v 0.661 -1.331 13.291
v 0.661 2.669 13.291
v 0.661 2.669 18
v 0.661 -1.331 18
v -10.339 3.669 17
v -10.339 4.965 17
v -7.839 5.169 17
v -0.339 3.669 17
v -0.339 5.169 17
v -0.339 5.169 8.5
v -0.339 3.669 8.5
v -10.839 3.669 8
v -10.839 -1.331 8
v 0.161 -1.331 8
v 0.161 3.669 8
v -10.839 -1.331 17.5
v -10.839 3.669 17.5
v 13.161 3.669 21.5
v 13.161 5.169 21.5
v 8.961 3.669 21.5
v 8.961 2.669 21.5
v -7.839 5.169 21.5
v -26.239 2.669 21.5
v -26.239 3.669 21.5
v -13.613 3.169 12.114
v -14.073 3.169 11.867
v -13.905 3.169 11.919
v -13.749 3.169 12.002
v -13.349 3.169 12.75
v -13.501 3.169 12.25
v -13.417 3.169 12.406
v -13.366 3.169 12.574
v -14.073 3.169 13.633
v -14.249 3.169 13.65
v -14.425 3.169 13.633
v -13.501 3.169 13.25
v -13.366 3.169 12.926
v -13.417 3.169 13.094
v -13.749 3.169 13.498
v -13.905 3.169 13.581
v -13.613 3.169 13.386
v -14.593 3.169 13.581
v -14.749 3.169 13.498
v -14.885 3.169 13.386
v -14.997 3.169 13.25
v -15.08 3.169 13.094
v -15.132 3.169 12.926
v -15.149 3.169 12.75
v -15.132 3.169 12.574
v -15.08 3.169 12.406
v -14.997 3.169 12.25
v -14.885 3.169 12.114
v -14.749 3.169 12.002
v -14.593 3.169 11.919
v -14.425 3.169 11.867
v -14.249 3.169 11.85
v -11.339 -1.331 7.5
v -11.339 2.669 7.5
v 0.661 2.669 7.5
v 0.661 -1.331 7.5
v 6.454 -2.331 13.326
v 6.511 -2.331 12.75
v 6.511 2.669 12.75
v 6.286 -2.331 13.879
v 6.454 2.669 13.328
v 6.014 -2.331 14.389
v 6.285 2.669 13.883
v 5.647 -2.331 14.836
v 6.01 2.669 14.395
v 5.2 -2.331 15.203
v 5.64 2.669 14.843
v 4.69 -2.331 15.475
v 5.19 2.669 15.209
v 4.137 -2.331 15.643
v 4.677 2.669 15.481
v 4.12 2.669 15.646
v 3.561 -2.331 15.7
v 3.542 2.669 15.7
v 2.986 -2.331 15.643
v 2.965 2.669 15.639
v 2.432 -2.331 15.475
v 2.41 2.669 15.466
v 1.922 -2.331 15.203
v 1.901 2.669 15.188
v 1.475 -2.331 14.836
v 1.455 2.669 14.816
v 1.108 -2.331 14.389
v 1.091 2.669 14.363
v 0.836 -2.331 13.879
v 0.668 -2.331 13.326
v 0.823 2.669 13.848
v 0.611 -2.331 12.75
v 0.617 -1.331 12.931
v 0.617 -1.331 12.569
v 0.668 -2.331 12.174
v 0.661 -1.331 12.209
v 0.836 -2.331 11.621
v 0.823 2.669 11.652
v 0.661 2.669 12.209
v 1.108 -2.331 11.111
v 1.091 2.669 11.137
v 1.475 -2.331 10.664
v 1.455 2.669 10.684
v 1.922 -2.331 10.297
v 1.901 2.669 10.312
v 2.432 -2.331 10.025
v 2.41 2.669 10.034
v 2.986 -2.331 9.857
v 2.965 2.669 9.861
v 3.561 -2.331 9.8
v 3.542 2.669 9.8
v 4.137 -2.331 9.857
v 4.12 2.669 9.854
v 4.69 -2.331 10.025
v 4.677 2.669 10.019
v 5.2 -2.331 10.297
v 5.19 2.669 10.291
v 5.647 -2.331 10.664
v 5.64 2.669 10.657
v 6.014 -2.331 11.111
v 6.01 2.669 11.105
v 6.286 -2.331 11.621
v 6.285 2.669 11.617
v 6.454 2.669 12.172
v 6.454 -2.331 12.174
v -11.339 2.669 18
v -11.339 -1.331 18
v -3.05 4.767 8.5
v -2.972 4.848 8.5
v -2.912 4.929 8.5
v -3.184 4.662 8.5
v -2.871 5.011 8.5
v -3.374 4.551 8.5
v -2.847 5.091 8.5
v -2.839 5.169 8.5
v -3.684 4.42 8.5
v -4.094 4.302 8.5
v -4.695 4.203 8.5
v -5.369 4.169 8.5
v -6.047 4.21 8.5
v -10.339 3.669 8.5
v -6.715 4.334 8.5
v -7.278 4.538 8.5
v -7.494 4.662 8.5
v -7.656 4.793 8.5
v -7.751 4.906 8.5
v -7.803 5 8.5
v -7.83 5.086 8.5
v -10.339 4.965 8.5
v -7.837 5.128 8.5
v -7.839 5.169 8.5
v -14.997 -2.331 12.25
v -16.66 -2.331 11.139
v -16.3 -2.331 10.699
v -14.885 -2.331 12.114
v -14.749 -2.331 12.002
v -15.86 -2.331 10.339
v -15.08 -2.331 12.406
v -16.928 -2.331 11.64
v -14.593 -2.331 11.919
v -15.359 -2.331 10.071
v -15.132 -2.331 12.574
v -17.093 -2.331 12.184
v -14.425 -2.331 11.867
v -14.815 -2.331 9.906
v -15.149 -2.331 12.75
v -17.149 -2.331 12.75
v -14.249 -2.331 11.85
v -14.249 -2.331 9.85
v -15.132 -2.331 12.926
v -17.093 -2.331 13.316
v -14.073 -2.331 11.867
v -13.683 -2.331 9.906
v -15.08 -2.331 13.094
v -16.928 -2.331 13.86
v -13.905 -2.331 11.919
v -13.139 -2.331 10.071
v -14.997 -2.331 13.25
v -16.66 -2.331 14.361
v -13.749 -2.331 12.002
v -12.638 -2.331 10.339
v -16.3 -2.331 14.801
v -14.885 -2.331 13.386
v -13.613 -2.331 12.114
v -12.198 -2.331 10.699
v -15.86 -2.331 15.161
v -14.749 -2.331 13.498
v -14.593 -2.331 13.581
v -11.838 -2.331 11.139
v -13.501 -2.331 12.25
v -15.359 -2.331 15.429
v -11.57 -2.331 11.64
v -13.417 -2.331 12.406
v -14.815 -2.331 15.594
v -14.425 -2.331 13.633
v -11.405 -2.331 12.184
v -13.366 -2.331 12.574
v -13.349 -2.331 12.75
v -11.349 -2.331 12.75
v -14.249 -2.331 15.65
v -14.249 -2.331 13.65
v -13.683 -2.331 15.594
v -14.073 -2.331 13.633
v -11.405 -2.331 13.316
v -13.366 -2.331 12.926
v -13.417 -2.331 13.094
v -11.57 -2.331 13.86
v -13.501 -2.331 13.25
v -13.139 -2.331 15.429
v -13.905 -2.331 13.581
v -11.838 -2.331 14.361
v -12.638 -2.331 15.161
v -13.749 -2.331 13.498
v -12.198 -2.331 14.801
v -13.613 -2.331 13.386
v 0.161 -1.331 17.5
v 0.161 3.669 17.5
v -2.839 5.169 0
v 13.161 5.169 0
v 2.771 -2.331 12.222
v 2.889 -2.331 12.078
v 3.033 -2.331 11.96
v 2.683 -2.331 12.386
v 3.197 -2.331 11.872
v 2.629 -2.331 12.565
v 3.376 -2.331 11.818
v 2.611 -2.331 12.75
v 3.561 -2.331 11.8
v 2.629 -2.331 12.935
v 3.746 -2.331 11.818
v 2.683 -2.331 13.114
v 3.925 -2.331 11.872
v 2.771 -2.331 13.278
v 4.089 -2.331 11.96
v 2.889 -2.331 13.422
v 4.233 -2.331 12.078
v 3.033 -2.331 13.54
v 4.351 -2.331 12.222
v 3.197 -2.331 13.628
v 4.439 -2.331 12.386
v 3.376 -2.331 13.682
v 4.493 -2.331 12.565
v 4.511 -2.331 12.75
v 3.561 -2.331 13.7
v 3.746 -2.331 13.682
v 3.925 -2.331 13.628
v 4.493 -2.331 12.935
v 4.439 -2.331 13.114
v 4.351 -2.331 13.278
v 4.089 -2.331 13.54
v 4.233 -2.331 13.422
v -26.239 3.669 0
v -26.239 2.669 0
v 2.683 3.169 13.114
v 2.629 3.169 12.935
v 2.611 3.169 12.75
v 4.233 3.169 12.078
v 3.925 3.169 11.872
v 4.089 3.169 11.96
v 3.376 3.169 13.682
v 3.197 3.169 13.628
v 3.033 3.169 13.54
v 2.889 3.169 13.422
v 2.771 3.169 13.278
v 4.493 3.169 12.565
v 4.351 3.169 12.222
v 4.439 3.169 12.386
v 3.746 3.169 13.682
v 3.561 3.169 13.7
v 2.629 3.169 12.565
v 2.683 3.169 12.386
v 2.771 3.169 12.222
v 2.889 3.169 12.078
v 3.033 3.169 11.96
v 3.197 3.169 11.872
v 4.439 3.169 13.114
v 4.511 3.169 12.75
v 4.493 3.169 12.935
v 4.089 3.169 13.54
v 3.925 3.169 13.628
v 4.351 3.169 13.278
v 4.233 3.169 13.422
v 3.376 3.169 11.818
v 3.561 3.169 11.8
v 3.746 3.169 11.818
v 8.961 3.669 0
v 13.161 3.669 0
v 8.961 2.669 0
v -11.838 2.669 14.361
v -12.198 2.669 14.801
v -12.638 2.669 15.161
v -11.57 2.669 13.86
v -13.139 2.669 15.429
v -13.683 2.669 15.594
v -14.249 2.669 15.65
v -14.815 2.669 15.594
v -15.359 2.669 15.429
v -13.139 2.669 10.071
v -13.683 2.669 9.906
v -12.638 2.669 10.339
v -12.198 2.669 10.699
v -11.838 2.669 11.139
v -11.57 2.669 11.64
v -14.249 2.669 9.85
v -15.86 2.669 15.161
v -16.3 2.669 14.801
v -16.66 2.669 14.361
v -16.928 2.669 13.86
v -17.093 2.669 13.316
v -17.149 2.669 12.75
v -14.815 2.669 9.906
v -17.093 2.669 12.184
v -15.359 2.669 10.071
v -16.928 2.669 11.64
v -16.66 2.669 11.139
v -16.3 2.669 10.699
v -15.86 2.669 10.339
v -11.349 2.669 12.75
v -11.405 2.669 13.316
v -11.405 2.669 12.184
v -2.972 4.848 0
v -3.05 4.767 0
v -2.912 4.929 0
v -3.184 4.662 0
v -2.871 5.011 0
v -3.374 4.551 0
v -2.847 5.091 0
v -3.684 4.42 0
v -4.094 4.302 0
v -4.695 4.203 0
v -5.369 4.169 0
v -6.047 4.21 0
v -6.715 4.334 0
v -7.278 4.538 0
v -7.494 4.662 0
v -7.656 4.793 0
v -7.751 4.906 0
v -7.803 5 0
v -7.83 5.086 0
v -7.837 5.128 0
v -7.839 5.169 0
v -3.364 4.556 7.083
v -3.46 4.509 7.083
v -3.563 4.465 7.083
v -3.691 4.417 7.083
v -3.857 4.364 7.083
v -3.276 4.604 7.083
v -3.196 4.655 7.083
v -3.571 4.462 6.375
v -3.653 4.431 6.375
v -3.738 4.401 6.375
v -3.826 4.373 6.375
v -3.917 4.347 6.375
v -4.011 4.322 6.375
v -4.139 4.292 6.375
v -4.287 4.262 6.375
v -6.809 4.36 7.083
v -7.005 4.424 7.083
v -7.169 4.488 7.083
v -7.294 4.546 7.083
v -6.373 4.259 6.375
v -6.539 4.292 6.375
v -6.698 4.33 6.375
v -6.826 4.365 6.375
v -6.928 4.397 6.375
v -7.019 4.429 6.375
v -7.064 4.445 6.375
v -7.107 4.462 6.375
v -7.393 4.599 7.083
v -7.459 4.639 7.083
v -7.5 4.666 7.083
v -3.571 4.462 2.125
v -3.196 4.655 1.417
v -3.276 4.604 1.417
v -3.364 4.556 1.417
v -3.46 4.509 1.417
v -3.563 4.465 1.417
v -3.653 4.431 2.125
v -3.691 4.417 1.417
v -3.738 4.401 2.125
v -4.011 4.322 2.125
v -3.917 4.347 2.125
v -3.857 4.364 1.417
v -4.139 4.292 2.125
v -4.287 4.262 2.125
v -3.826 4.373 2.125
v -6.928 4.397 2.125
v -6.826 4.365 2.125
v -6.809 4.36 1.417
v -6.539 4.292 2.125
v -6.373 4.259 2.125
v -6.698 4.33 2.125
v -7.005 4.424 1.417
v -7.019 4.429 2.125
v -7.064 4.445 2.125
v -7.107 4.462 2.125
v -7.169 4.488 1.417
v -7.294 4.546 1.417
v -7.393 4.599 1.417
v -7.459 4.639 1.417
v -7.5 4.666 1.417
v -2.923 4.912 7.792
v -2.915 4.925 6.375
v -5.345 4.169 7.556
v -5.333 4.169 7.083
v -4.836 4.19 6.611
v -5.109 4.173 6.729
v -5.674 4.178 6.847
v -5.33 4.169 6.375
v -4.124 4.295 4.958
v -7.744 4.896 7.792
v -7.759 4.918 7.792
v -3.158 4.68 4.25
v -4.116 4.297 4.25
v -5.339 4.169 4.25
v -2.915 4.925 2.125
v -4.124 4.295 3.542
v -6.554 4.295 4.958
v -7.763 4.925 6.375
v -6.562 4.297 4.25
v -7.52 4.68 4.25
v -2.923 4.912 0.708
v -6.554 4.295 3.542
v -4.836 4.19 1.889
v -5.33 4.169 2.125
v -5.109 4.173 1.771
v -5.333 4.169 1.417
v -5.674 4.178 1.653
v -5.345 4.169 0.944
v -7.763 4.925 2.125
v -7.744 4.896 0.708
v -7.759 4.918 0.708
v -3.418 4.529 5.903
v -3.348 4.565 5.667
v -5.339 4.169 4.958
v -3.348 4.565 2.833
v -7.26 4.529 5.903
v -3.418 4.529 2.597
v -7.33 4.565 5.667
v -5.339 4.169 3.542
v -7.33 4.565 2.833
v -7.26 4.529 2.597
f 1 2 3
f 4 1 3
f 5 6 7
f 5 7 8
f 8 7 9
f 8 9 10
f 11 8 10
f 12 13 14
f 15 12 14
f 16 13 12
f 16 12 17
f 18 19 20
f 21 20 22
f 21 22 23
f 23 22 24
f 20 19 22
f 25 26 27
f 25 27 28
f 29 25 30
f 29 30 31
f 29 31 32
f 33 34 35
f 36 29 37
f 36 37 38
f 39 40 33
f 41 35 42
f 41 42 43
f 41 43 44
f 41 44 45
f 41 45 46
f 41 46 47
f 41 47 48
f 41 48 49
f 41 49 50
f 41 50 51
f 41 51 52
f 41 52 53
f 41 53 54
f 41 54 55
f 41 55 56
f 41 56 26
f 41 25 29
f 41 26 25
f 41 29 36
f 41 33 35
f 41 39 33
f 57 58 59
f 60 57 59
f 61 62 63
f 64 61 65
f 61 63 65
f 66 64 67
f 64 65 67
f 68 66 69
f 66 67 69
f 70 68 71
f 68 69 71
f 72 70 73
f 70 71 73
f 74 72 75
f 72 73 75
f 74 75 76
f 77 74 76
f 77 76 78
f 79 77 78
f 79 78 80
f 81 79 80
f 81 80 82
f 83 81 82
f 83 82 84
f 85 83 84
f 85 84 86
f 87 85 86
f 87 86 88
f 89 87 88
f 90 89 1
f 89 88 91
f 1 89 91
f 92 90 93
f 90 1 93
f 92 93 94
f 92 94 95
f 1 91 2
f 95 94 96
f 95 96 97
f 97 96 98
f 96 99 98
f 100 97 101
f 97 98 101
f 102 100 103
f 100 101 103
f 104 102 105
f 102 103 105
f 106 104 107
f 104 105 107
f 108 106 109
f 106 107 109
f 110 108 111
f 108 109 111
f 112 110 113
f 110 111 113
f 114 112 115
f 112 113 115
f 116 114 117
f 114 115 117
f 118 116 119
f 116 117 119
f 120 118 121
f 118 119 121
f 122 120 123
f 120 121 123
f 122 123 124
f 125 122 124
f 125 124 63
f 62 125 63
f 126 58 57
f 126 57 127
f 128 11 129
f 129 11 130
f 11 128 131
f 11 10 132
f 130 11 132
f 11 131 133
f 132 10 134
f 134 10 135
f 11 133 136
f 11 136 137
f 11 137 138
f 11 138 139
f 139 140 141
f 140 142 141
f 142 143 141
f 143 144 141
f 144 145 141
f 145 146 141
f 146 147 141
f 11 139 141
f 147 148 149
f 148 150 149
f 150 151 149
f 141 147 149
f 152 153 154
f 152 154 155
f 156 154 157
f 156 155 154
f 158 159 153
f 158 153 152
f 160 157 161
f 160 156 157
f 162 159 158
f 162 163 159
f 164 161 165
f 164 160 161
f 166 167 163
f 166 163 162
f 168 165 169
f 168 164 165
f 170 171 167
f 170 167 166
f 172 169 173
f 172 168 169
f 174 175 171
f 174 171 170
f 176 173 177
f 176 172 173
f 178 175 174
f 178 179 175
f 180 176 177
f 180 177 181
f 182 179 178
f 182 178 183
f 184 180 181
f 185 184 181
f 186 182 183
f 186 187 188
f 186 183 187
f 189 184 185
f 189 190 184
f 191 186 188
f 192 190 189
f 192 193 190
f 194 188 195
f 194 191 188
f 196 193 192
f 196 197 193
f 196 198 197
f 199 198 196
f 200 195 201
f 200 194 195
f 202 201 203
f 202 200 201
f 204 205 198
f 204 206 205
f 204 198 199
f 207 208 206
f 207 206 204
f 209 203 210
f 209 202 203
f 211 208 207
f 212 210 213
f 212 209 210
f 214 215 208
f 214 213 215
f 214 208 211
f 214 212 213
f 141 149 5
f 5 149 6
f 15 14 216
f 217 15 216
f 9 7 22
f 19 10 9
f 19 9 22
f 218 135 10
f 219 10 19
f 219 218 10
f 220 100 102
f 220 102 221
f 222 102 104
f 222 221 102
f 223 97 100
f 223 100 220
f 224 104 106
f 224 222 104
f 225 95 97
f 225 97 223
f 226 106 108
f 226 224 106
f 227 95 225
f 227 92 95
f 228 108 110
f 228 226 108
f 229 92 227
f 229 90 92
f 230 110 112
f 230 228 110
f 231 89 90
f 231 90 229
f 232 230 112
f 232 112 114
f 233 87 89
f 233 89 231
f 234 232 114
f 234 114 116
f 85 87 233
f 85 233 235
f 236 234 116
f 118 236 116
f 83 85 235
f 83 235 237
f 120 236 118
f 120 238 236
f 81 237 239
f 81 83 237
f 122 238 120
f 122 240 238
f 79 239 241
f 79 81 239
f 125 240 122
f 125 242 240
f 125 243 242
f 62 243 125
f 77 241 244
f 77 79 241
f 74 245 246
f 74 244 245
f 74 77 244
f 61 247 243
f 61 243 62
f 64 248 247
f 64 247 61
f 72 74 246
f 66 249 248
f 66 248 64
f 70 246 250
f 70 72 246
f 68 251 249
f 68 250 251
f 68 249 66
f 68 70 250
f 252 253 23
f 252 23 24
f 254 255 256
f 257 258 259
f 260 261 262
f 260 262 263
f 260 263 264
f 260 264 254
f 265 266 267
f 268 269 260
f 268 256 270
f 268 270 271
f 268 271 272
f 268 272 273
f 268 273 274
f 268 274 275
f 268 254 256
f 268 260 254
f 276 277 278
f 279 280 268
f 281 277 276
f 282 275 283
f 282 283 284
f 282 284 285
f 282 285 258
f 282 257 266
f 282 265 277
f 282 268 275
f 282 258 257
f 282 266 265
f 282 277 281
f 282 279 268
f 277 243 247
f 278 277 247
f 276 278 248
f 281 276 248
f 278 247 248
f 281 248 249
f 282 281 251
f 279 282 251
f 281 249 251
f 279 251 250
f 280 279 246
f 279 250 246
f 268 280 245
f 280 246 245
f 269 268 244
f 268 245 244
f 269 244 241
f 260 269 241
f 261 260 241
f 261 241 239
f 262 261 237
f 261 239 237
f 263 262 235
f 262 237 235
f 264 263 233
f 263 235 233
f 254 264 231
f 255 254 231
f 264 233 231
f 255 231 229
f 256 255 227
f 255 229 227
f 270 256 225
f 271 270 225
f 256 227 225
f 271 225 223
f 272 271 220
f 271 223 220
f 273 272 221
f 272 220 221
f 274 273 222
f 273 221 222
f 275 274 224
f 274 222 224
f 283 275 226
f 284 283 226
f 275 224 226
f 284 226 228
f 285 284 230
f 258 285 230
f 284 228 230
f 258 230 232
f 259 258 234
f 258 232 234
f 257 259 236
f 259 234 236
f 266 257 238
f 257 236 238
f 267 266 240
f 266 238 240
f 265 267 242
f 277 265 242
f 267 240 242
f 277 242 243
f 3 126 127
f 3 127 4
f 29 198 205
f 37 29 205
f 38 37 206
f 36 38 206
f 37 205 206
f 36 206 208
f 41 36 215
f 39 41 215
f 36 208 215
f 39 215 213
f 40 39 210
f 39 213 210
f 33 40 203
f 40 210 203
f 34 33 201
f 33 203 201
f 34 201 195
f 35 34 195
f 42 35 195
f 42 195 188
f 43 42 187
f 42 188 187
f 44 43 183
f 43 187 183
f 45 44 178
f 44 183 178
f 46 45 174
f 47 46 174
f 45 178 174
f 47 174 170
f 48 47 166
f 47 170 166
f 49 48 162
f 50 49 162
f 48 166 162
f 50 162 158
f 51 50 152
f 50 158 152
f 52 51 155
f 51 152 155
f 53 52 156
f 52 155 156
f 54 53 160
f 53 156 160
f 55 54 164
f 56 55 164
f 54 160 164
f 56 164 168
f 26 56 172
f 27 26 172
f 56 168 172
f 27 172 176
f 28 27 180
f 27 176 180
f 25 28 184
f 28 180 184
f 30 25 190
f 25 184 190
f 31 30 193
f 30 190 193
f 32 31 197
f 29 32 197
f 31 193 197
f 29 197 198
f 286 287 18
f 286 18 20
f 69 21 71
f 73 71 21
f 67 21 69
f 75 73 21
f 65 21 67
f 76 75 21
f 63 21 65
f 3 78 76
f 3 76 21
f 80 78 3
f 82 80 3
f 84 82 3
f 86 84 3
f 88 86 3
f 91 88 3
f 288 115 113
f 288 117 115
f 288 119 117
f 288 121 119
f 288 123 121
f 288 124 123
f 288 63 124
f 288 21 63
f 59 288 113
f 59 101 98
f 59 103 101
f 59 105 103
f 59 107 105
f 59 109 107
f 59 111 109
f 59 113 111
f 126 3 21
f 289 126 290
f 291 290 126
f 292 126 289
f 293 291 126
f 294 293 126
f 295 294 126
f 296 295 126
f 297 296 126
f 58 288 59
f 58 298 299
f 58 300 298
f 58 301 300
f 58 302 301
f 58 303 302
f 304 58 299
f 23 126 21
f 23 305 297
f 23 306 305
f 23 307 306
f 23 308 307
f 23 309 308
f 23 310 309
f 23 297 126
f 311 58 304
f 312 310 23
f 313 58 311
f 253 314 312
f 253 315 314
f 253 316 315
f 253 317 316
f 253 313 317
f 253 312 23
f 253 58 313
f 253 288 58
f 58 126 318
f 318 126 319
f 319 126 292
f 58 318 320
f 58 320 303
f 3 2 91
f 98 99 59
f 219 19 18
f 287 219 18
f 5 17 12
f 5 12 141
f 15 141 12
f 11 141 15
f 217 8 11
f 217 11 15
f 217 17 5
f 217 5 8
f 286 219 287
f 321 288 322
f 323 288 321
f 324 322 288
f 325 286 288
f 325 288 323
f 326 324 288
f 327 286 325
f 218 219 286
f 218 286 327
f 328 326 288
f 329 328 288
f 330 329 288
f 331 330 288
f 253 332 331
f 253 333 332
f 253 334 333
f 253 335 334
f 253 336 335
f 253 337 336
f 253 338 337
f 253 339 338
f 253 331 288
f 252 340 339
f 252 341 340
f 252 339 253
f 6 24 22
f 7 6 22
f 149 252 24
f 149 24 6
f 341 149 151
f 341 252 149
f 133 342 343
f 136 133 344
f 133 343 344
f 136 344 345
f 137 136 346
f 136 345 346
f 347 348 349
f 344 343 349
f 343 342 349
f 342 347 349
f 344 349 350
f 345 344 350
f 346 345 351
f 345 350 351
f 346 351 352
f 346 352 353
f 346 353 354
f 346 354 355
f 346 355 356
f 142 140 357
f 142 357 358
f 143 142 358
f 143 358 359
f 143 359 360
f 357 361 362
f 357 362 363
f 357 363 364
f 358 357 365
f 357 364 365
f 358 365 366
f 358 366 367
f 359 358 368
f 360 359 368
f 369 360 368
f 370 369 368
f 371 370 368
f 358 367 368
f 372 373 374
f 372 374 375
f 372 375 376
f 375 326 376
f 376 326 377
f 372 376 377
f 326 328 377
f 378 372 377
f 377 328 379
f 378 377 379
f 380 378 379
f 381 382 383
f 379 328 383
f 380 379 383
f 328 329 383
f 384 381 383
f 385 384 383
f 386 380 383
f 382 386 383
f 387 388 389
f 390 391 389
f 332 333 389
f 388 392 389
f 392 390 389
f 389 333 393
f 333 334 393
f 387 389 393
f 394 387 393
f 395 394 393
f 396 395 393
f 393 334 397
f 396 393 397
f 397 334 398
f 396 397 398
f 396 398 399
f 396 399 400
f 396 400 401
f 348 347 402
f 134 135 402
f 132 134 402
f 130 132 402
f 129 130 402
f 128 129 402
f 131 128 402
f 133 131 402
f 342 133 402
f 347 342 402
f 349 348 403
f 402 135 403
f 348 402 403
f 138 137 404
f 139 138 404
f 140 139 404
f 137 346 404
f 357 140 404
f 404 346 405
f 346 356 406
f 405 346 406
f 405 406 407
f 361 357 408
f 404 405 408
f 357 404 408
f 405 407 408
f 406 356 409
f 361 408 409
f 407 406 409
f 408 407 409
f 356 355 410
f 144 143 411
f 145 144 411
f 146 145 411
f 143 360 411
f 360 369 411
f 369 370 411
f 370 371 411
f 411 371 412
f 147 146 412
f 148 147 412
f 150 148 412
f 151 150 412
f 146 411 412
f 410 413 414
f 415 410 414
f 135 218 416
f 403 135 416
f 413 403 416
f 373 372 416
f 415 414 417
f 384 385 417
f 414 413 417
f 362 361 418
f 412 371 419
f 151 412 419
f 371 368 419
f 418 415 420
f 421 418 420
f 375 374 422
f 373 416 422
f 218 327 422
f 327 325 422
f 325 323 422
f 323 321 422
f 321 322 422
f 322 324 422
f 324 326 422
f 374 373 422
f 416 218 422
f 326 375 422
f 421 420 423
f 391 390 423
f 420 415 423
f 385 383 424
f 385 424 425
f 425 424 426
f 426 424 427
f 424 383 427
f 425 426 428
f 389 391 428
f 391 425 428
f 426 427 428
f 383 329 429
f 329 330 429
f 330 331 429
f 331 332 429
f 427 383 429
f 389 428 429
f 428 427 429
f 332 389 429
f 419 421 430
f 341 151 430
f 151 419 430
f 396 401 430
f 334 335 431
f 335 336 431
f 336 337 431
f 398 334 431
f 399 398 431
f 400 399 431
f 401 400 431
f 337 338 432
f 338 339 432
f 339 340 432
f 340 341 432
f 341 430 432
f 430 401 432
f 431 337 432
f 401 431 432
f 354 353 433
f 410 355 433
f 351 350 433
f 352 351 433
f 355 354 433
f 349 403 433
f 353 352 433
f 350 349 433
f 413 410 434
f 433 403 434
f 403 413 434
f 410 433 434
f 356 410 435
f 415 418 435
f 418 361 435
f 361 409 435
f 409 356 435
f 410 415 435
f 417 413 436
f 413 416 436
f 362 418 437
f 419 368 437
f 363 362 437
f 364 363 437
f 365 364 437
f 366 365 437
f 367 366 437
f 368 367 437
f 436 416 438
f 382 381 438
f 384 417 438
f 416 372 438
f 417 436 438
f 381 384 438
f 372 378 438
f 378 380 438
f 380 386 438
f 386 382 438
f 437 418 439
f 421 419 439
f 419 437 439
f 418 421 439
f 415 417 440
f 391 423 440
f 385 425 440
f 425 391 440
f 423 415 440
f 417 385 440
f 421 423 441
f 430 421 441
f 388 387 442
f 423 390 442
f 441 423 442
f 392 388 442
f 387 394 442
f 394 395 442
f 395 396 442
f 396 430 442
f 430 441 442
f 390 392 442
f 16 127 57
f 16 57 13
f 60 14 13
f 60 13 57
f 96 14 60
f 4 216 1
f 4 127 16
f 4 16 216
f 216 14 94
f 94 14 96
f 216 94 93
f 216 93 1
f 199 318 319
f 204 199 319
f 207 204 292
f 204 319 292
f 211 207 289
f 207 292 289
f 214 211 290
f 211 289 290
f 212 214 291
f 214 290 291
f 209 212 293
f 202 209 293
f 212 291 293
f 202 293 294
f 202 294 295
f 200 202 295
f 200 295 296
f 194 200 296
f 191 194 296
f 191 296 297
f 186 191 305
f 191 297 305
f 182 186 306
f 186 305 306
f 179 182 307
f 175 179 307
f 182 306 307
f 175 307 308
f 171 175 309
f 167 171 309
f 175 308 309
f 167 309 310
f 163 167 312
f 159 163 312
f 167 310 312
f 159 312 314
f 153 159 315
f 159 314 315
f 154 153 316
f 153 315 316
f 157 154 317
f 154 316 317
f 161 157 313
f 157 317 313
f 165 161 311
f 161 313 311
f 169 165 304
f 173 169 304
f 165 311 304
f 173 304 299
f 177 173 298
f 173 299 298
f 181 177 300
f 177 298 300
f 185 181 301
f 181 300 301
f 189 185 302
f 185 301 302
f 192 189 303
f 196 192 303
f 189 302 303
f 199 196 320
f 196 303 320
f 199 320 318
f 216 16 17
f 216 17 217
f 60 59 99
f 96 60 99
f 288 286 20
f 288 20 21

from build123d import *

# Parameters (mm, degrees)
SALIENTE_EXTRUIR1_DEPTH  = 21.5
CORTAR_EXTRUIR1_DEPTH    = 8.5
CORTAR_EXTRUIR2_DEPTH    = 3.5000001
CROQUIS5_W               = 12
CROQUIS5_H               = 10.5
SALIENTE_EXTRUIR2_DEPTH  = 4
CROQUIS6_W               = 11
CROQUIS6_H               = 9.5
CORTAR_EXTRUIR3_DEPTH    = 5
CROQUIS8_R               = 2.95
SALIENTE_EXTRUIR8_DEPTH  = 5
CROQUIS9_R               = 0.95
CORTAR_EXTRUIR4_DEPTH    = 5.5
CROQUIS12_R              = 2.9
SALIENTE_EXTRUIR14_DEPTH = 5
CROQUIS13_R              = 0.9
CORTAR_EXTRUIR5_DEPTH    = 5.5


with BuildPart() as part:
    # Croquis1 → Saliente-Extruir1 (new body)
    with BuildSketch(Plane.XY):
        Polygon((-7.838981289, 5.169230769), (13.161018711, 5.169230769), (13.161018711, 3.669230769), (8.961018711, 3.669230769), (8.961018711, 2.669230769), (-26.238981289, 2.669230769), (-26.238981289, 3.669230769), align=None)
    extrude(amount=SALIENTE_EXTRUIR1_DEPTH)

    # Croquis2 → Cortar-Extruir1 (cut)
    with BuildSketch(Plane(origin=(0, 0, 0), x_dir=(-1, 0, 0), z_dir=(0, 0, -1))):
        with BuildLine():
            Line((2.838981289, 5.169230769), (7.838981289, 5.169230769))
            add(Edge.make_bspline(
                [(5.338981289, 4.169230769), (7.838981289, 4.169230769), (7.838981289, 5.169230769)],
                knots=[4.71238898, 4.71238898, 4.71238898, 6.283185307, 6.283185307, 6.283185307], degree=2, weights=[1, 0.707106781, 1]))
            add(Edge.make_bspline(
                [(2.838981289, 5.169230769), (2.838981289, 4.169230769), (5.338981289, 4.169230769)],
                knots=[0, 0, 0, 1.570796327, 1.570796327, 1.570796327], degree=2, weights=[1, 0.707106781, 1]))
        make_face()
    extrude(amount=-CORTAR_EXTRUIR1_DEPTH, mode=Mode.SUBTRACT)

    # Croquis3 → Cortar-Extruir2 (cut, through all)
    with BuildSketch(Plane(origin=(0, 5.169230769, 0), x_dir=(1, 0, 0), z_dir=(0, 1, 0))):
        Polygon((-5.338981289, -8.5), (-10.338981289, -8.5), (-10.338981289, -17), (-0.338981289, -17), (-0.338981289, -8.5), align=None)
    extrude(amount=-CORTAR_EXTRUIR2_DEPTH, mode=Mode.SUBTRACT)

    # Croquis5 → Saliente-Extruir2 (add)
    with BuildSketch(Plane.XZ.offset(-2.669230769)):
        with Locations((-5.338981289, 12.75)):
            Rectangle(CROQUIS5_W, CROQUIS5_H)
    extrude(amount=SALIENTE_EXTRUIR2_DEPTH)

    # Croquis6 → Cortar-Extruir3 (cut)
    with BuildSketch(Plane.XZ.offset(1.330769231)):
        with Locations((-5.338981289, 12.75)):
            Rectangle(CROQUIS6_W, CROQUIS6_H)
    extrude(amount=-CORTAR_EXTRUIR3_DEPTH, mode=Mode.SUBTRACT)

    # Croquis8 → Saliente-Extruir8 (add)
    with BuildSketch(Plane.XZ.offset(-2.669230769)):
        with Locations((3.561018711, 12.75)):
            Circle(CROQUIS8_R)
    extrude(amount=SALIENTE_EXTRUIR8_DEPTH)

    # Croquis9 → Cortar-Extruir4 (cut)
    with BuildSketch(Plane.XZ.offset(2.330769231)):
        with Locations((3.561018711, 12.75)):
            Circle(CROQUIS9_R)
    extrude(amount=-CORTAR_EXTRUIR4_DEPTH, mode=Mode.SUBTRACT)

    # Croquis12 → Saliente-Extruir14 (add)
    with BuildSketch(Plane.XZ.offset(-2.669230769)):
        with Locations((-14.248981289, 12.75)):
            Circle(CROQUIS12_R)
    extrude(amount=SALIENTE_EXTRUIR14_DEPTH)

    # Croquis13 → Cortar-Extruir5 (cut)
    with BuildSketch(Plane.XZ.offset(2.330769231)):
        with Locations((-14.248981289, 12.75)):
            Circle(CROQUIS13_R)
    extrude(amount=-CORTAR_EXTRUIR5_DEPTH, mode=Mode.SUBTRACT)


solid = part.part
